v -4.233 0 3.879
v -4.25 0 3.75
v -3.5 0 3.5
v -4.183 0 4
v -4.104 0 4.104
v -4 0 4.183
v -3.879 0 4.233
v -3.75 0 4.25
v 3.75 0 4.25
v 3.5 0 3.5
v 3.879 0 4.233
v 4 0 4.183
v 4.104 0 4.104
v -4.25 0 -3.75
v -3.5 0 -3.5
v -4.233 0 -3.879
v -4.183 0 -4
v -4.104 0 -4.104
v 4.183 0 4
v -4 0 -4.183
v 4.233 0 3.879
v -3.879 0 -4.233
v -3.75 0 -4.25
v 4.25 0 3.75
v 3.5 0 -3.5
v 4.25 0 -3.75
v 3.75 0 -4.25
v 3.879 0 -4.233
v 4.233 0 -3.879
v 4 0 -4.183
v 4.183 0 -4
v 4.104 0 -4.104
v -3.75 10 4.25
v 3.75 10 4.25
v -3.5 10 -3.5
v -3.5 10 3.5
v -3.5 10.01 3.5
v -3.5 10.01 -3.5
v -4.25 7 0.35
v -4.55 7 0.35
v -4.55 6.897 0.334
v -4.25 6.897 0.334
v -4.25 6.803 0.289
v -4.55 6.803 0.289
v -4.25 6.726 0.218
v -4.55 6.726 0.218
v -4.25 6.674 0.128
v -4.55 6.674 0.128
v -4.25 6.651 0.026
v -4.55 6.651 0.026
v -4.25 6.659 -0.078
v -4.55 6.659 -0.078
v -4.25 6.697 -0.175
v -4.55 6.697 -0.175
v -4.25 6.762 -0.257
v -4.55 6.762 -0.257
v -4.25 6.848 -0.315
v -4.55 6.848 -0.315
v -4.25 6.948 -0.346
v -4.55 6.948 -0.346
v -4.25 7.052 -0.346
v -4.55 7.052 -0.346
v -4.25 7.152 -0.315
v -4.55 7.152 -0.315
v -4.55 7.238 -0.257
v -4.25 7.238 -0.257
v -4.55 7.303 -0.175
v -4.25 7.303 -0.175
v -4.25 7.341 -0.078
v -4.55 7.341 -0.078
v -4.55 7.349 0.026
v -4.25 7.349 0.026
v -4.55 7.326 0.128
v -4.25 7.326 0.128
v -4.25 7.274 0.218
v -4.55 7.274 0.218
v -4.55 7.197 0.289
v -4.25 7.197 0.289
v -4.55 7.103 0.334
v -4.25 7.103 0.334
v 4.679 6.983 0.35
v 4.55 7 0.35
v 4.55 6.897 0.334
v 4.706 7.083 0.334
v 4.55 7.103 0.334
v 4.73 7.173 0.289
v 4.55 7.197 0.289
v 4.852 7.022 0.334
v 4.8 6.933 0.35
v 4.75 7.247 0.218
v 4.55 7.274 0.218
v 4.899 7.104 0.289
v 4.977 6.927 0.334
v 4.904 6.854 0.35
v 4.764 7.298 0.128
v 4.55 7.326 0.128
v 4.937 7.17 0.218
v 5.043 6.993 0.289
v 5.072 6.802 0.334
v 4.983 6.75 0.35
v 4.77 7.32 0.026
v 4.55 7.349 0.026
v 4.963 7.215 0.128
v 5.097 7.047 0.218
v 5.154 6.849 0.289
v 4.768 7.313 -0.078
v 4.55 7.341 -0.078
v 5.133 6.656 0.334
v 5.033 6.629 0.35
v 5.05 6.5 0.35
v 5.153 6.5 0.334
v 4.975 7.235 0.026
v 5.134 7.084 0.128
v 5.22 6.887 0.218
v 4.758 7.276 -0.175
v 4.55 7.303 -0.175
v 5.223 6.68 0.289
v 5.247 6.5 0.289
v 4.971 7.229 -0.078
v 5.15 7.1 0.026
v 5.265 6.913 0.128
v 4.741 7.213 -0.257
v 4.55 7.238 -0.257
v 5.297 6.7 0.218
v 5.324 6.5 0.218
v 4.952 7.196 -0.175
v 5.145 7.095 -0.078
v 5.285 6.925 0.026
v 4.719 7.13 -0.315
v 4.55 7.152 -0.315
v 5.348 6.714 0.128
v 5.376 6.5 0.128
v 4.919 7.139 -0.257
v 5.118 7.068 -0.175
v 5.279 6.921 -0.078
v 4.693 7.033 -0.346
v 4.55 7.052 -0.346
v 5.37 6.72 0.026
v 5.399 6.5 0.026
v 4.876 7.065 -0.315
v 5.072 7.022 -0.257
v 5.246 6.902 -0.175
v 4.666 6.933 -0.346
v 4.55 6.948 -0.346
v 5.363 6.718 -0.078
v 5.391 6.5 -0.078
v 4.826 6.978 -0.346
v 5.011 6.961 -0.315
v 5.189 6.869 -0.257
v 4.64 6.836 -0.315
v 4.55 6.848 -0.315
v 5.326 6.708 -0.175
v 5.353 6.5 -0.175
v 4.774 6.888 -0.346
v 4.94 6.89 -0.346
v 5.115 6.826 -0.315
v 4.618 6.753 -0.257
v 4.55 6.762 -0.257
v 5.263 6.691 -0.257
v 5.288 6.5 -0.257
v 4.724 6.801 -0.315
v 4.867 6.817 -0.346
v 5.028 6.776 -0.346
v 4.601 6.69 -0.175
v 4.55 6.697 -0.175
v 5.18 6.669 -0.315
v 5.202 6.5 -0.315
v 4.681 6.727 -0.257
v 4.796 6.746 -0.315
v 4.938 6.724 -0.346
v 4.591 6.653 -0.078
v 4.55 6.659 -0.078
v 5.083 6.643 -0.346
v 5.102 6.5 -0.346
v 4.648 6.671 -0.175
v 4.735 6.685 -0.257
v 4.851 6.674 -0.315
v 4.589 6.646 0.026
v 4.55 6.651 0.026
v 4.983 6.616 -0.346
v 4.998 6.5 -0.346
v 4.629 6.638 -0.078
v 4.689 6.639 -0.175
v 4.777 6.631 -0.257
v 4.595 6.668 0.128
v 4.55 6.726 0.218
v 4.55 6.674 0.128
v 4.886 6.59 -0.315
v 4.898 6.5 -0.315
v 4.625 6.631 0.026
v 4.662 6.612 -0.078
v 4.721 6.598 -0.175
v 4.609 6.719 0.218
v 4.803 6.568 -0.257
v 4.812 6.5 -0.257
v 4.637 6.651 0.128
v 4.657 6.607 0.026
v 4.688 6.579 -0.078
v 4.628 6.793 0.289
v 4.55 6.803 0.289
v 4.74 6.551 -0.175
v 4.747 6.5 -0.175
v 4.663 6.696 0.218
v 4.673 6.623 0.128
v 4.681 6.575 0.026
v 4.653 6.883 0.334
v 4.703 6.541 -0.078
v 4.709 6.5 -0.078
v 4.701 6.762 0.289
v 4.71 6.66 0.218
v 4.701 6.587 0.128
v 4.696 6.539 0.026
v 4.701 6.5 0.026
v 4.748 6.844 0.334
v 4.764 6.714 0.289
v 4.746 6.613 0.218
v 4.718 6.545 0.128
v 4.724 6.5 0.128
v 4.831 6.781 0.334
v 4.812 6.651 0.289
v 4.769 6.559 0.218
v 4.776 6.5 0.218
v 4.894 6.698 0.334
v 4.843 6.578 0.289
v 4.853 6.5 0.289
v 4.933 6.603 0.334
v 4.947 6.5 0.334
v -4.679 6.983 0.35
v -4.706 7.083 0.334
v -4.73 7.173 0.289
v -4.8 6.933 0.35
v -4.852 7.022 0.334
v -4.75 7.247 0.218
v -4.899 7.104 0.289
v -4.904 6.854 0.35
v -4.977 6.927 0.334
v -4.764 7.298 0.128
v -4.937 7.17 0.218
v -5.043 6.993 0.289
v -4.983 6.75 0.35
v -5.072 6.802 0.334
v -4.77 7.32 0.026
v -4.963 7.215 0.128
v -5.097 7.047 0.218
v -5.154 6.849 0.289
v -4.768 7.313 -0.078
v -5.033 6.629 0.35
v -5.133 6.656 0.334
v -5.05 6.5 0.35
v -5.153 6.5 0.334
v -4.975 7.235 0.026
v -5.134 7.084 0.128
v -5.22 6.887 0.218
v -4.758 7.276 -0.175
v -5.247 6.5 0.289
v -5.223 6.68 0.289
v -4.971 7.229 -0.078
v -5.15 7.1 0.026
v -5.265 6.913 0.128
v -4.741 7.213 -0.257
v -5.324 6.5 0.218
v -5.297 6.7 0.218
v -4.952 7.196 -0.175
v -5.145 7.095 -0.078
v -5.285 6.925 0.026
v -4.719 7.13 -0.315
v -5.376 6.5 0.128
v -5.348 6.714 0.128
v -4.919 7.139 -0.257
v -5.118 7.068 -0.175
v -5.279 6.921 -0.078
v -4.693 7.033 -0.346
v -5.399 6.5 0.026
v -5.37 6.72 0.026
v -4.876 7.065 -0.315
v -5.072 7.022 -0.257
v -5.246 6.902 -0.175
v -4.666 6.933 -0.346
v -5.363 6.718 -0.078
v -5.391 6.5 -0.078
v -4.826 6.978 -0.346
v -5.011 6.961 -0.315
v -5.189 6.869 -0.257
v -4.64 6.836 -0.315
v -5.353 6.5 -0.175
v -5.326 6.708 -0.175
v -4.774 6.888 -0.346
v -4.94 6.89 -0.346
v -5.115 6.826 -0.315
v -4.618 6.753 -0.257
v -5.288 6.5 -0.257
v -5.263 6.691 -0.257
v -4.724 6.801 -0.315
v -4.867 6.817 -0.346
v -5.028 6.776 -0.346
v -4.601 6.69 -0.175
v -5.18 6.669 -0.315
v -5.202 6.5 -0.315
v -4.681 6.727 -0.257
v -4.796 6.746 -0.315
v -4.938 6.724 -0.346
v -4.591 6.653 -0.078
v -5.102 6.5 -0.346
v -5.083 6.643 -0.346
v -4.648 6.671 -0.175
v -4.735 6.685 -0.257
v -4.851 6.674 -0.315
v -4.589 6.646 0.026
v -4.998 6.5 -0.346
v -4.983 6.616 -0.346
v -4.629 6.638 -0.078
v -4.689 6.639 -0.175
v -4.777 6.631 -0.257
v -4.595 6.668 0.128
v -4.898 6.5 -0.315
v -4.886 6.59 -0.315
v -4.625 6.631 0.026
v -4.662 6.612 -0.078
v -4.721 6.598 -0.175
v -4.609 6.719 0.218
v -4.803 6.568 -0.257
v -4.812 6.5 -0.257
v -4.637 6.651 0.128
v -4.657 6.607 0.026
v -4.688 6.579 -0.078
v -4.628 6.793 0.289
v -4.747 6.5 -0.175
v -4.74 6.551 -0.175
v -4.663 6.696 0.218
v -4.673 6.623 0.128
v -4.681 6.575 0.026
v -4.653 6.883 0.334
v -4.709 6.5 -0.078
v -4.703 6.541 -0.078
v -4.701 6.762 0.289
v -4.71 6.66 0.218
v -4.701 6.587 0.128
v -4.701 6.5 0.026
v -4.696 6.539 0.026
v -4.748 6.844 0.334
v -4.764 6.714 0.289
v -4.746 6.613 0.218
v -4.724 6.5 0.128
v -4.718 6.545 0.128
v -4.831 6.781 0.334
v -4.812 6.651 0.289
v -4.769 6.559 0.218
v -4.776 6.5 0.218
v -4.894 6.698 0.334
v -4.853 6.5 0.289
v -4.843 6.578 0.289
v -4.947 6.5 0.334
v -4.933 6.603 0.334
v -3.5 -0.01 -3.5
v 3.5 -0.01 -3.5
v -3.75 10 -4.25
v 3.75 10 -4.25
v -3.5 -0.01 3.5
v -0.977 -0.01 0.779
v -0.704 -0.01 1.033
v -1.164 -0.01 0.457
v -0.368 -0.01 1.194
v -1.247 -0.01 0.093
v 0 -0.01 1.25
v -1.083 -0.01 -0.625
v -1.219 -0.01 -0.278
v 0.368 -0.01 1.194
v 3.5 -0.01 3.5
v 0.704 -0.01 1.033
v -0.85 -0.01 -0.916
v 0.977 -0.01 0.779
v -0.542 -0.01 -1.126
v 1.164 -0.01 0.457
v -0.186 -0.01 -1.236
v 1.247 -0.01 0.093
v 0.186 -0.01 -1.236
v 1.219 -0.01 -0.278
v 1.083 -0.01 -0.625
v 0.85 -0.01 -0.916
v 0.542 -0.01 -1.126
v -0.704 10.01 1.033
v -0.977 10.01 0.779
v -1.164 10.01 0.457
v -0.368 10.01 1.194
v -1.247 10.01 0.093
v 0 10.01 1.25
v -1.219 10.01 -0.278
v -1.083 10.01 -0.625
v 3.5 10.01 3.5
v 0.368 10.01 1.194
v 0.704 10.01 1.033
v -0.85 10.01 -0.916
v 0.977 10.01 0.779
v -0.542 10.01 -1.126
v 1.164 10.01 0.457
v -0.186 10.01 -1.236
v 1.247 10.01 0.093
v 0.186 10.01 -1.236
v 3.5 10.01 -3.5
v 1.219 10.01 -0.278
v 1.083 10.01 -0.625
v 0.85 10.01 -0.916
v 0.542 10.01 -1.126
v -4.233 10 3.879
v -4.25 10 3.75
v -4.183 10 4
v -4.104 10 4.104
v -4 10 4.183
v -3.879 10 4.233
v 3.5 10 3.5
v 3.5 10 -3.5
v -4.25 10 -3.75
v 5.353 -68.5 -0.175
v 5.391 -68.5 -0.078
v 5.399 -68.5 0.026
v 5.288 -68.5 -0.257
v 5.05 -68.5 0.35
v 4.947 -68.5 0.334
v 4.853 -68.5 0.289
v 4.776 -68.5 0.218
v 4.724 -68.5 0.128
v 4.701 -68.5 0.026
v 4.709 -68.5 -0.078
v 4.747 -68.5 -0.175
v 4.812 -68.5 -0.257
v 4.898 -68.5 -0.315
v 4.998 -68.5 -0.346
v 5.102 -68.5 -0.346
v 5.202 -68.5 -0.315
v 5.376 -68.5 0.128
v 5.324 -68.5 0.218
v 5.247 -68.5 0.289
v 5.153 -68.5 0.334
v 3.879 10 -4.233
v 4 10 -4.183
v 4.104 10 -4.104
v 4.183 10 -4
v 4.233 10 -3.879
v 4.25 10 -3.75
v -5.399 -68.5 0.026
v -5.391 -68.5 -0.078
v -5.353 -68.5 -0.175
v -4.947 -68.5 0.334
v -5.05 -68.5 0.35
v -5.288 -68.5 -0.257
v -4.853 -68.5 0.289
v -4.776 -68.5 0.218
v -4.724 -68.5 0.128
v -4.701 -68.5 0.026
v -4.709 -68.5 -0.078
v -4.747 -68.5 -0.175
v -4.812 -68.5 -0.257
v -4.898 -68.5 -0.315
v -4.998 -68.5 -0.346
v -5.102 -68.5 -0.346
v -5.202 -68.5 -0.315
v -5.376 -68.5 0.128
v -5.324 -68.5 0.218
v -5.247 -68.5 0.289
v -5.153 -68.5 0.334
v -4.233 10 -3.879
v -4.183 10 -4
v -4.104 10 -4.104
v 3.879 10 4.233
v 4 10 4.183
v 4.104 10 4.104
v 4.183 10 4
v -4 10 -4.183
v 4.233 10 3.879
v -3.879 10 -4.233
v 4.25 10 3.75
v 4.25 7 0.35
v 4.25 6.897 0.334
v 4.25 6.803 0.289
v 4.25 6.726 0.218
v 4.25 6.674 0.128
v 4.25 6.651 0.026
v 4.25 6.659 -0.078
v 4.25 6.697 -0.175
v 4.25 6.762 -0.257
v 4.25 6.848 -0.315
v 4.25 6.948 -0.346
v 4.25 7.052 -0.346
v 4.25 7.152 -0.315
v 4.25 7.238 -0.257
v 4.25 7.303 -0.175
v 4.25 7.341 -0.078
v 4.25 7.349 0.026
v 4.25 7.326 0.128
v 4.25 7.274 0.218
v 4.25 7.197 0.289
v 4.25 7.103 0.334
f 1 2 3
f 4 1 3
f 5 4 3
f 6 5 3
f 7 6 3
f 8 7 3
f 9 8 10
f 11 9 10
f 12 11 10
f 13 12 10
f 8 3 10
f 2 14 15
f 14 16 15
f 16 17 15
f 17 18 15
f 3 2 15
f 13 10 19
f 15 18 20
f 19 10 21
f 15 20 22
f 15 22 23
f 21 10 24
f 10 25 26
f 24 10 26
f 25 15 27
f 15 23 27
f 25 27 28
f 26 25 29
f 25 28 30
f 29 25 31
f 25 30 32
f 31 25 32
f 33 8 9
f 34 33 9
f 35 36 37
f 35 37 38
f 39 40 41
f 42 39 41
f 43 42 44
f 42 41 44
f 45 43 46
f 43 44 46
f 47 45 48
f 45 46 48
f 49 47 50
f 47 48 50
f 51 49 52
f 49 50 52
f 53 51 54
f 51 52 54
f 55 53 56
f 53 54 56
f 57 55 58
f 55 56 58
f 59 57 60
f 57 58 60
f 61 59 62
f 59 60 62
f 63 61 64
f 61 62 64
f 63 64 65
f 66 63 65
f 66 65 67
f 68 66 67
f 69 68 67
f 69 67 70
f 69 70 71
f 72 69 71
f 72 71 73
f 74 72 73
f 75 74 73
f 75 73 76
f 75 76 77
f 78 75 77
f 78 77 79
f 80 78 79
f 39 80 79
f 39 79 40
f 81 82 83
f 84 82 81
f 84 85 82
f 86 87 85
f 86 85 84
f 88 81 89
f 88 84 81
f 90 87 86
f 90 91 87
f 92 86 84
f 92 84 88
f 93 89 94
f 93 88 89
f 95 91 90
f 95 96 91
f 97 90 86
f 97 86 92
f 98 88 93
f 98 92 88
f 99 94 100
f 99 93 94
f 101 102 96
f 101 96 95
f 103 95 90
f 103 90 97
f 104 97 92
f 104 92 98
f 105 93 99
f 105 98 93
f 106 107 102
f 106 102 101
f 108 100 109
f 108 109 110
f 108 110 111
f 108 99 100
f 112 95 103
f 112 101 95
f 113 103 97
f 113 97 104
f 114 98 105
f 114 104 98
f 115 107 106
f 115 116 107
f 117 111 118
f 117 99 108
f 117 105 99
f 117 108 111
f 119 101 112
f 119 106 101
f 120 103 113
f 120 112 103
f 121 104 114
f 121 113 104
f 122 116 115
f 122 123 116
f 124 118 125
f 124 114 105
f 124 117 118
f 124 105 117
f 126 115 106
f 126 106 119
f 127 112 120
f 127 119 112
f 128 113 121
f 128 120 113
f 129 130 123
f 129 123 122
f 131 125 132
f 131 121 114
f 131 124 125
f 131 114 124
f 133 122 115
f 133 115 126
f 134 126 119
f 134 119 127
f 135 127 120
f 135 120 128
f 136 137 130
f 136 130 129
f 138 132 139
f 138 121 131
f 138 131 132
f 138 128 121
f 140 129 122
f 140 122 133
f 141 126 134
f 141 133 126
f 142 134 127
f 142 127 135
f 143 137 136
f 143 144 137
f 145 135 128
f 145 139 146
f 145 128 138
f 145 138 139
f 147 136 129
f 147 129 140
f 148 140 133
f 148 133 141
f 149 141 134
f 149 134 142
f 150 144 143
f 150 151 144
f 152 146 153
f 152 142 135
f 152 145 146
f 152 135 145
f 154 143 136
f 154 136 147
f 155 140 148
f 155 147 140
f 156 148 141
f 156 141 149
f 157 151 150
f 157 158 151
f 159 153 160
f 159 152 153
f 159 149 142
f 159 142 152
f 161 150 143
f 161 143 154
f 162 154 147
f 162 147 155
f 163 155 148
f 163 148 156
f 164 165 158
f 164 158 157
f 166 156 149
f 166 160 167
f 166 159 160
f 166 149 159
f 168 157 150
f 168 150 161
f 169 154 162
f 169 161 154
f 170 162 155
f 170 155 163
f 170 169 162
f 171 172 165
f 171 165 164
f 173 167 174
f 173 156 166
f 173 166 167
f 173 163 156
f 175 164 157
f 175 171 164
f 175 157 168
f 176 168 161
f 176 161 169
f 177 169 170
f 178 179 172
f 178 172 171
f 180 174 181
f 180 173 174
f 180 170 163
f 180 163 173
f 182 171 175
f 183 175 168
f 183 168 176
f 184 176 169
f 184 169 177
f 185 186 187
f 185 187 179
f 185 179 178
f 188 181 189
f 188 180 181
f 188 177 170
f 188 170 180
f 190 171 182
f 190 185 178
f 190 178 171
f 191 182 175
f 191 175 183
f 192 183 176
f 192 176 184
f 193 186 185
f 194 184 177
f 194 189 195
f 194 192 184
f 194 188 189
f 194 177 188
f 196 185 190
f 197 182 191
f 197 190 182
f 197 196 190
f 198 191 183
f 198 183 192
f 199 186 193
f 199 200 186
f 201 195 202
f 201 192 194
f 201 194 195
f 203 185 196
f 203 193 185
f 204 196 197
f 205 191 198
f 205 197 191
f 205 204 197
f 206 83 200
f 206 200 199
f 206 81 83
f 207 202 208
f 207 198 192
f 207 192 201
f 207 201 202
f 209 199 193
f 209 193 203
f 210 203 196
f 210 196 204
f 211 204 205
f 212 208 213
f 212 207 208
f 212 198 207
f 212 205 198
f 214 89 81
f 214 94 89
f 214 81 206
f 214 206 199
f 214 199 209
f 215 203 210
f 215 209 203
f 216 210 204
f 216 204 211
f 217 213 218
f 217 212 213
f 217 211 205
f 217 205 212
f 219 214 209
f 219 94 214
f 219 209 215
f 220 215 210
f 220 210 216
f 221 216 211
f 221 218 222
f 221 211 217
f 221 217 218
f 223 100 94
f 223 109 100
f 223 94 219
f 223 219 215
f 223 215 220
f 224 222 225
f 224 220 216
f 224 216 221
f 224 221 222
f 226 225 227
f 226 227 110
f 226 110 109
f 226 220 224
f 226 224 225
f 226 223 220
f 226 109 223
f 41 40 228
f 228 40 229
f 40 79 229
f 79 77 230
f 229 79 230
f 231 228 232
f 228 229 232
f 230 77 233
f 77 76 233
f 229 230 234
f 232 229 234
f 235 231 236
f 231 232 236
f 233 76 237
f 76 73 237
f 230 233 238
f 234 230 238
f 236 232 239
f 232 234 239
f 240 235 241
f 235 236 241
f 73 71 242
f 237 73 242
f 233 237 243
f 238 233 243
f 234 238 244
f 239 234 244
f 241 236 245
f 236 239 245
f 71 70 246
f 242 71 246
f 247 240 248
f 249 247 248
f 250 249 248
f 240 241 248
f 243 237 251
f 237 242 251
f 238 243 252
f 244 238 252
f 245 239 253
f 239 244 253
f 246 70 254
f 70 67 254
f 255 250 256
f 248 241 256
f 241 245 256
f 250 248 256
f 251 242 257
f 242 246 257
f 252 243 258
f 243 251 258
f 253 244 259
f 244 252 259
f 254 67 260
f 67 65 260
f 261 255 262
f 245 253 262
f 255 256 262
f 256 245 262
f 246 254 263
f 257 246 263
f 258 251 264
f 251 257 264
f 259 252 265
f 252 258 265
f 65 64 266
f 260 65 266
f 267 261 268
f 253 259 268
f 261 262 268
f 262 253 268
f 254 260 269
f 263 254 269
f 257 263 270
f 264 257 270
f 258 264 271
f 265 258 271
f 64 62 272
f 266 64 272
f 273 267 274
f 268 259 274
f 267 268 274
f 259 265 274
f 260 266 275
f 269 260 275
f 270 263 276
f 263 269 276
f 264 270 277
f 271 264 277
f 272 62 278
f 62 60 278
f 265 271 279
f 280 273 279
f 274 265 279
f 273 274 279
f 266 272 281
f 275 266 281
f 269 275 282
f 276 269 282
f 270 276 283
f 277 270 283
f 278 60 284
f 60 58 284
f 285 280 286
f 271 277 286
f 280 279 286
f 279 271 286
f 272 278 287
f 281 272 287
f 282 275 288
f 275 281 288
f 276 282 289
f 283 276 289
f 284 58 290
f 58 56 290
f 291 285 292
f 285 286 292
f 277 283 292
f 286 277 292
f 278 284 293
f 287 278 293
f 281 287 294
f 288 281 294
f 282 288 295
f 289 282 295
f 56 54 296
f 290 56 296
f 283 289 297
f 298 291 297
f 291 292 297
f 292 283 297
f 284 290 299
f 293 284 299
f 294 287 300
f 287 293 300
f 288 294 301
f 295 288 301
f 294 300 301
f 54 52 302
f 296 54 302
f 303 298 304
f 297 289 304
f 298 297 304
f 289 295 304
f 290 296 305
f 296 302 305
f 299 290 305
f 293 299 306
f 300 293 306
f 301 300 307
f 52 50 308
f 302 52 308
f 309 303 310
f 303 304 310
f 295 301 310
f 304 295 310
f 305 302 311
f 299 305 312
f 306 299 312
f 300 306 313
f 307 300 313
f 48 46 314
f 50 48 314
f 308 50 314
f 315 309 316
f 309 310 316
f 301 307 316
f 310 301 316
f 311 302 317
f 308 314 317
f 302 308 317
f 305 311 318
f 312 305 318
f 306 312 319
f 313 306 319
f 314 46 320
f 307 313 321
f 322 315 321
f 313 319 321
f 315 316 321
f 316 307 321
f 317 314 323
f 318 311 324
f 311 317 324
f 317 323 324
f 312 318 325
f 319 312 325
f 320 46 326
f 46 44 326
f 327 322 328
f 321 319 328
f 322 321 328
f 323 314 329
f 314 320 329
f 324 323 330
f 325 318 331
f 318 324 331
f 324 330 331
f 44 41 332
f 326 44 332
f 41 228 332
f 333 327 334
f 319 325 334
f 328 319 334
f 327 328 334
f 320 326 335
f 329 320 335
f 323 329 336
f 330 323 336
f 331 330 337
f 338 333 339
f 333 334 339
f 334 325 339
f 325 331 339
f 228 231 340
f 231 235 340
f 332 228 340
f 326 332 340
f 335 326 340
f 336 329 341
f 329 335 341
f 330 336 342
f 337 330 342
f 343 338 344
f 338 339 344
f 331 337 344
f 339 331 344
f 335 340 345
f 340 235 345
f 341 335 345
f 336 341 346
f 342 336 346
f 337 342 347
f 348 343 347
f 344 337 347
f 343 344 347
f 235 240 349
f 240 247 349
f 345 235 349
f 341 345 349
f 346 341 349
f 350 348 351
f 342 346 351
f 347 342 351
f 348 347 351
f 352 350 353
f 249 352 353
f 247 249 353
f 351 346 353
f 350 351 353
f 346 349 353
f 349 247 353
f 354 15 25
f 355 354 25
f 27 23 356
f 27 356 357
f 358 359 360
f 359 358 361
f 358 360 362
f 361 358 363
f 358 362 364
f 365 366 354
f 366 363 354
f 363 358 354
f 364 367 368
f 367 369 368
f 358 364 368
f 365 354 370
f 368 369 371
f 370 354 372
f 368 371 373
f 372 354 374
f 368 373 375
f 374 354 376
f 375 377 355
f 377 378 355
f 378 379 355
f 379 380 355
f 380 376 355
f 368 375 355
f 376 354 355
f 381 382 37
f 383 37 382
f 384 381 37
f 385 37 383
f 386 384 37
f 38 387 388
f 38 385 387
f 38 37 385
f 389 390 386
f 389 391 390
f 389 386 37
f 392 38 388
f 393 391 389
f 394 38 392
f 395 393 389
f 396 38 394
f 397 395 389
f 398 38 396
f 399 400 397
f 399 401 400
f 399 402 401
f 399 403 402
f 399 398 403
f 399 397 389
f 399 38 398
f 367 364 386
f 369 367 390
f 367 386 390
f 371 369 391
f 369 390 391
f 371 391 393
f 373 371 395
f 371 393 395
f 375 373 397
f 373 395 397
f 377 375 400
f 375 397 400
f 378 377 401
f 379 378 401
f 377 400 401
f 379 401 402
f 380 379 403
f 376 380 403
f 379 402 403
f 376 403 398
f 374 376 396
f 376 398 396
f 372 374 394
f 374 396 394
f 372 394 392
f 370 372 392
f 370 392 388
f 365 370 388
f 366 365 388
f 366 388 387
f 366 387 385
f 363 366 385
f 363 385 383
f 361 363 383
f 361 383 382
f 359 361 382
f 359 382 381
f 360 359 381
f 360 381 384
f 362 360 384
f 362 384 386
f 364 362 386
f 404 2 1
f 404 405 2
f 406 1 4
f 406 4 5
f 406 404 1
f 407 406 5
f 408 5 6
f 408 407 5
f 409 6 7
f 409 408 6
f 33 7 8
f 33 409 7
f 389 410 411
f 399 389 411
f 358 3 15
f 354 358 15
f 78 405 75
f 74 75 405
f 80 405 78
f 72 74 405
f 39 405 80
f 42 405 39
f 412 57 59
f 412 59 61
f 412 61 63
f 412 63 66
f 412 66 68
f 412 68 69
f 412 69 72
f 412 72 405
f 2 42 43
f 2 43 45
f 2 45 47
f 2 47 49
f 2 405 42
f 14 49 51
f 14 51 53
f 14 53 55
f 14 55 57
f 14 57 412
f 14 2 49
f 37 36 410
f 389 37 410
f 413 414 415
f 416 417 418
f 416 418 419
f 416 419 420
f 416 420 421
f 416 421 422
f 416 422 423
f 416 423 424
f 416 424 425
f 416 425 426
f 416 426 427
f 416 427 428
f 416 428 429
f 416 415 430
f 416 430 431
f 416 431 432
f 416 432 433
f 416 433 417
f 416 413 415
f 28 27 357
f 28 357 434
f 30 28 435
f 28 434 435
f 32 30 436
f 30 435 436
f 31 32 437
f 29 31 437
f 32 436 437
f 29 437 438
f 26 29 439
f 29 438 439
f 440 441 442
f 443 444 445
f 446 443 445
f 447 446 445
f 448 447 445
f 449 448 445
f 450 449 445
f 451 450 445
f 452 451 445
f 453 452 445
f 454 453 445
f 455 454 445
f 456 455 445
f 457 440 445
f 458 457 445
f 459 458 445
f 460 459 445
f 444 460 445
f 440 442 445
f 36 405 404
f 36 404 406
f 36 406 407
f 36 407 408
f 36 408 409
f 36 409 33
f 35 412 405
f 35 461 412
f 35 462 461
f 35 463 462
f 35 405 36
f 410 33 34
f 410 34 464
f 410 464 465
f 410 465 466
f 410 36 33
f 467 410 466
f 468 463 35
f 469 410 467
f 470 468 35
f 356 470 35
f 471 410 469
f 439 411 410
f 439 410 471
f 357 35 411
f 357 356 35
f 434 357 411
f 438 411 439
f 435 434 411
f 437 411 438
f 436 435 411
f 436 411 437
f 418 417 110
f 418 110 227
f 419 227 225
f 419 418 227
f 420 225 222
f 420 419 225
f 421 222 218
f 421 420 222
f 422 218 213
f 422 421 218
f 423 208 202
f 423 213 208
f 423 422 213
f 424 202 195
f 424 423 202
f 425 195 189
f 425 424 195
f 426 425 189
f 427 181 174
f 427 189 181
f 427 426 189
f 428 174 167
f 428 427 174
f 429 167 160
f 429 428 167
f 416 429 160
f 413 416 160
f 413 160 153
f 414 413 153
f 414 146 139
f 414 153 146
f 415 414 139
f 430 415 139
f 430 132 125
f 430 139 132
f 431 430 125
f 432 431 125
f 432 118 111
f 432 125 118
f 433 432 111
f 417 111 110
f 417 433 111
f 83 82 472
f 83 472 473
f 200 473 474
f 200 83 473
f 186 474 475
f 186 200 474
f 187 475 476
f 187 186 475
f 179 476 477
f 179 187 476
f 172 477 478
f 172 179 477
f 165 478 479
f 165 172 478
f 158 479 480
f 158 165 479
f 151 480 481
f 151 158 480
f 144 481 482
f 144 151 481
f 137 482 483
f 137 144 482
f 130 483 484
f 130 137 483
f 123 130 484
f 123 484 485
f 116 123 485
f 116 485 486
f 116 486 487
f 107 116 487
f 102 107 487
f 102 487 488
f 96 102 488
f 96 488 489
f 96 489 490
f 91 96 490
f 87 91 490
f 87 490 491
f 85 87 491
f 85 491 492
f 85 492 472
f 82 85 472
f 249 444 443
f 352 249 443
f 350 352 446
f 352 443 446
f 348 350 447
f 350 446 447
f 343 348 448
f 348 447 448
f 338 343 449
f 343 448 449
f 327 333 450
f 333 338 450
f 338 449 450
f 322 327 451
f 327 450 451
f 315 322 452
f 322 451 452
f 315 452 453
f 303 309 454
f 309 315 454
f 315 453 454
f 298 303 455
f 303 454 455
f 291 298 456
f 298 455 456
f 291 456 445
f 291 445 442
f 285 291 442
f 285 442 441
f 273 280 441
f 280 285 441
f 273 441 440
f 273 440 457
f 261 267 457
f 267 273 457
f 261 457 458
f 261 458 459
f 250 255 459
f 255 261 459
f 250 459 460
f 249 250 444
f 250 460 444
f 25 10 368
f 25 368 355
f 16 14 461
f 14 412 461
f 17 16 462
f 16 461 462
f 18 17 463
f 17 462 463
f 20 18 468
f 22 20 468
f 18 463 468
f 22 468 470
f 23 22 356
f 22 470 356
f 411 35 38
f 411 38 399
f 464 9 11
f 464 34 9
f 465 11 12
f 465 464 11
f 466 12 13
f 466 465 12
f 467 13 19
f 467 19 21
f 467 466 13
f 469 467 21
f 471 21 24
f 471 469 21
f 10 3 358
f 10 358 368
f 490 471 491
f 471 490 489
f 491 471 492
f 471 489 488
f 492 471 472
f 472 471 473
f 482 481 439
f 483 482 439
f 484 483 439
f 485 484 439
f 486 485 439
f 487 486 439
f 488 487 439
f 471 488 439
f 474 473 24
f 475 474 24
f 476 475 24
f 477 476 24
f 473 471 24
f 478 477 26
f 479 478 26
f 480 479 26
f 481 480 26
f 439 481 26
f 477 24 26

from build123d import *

# Parameters (mm, degrees)
SKETCH1_W                = 8.5
SKETCH1_H                = 8.5
BOSS_EXTRUDE1_DEPTH      = 10
SKETCH2_W                = 7
SKETCH2_H                = 7
BOSS_EXTRUDE2_DEPTH      = 10.01
BOSS_EXTRUDE2_DEPTH_BACK = 0.01
FILLET2_R                = 0.5
SKETCH35_R               = 1.25
CUT_EXTRUDE1_DEPTH       = 20
SWEEP1_PROFILE_R         = 0.35


with BuildPart() as part:
    # Sketch1 → Boss-Extrude1 (new body)
    with BuildSketch(Plane(origin=(0, 0, 0), x_dir=(1, 0, 0), z_dir=(0, 1, 0))):
        Rectangle(SKETCH1_W, SKETCH1_H)
    extrude(amount=BOSS_EXTRUDE1_DEPTH)

    # Sketch2 → Boss-Extrude2 (add, two sides)
    with BuildSketch(Plane(origin=(0, 0, 0), x_dir=(1, 0, 0), z_dir=(0, 1, 0))) as boss_extrude2_sk:
        Rectangle(SKETCH2_W, SKETCH2_H)
    extrude(amount=BOSS_EXTRUDE2_DEPTH)
    extrude(boss_extrude2_sk.sketch, amount=-BOSS_EXTRUDE2_DEPTH_BACK)

    # Fillet2
    fillet2_edges = [part.edges().sort_by_distance(p)[0] for p in [
        (4.25, 5, 4.25),
        (-4.25, 5, 4.25),
        (-4.25, 5, -4.25),
        (4.25, 5, -4.25),
    ]]
    fillet(fillet2_edges, radius=FILLET2_R)

    # Sketch35 → Cut-Extrude1 (cut)
    with BuildSketch(Plane(origin=(0, 10.01, 0), x_dir=(1, 0, 0), z_dir=(0, 1, 0))):
        with Locations(Location((0, 0, 0), (0, 0, 270))):  # turned: the seam where the file's is
            Circle(SKETCH35_R)
    extrude(amount=-CUT_EXTRUDE1_DEPTH, mode=Mode.SUBTRACT)

    # Sweep1: sweep along a path in Sketch37
    with BuildLine(Plane.XY) as sweep1_path:
        Line((4.25, 7), (4.55, 7))
        ThreePointArc((4.55, 7), (4.903553391, 6.853553391), (5.05, 6.5))
        Line((5.05, 6.5), (5.05, -68.5))
    # Sweep1 profile (on start of the path) → Sweep1 (sweep)
    with BuildSketch(Plane(origin=(4.25, 7, 0), x_dir=(0, 0, 1), z_dir=(1, 0, 0))):
        Circle(SWEEP1_PROFILE_R)
    sweep1 = sweep(path=sweep1_path.line)

    # Mirror1: Sweep1 across plane
    add(sweep1.mirror(Plane(origin=(0, 0, 0), x_dir=(0, 0, 1), z_dir=(1, 0, 0))))


solid = part.part
